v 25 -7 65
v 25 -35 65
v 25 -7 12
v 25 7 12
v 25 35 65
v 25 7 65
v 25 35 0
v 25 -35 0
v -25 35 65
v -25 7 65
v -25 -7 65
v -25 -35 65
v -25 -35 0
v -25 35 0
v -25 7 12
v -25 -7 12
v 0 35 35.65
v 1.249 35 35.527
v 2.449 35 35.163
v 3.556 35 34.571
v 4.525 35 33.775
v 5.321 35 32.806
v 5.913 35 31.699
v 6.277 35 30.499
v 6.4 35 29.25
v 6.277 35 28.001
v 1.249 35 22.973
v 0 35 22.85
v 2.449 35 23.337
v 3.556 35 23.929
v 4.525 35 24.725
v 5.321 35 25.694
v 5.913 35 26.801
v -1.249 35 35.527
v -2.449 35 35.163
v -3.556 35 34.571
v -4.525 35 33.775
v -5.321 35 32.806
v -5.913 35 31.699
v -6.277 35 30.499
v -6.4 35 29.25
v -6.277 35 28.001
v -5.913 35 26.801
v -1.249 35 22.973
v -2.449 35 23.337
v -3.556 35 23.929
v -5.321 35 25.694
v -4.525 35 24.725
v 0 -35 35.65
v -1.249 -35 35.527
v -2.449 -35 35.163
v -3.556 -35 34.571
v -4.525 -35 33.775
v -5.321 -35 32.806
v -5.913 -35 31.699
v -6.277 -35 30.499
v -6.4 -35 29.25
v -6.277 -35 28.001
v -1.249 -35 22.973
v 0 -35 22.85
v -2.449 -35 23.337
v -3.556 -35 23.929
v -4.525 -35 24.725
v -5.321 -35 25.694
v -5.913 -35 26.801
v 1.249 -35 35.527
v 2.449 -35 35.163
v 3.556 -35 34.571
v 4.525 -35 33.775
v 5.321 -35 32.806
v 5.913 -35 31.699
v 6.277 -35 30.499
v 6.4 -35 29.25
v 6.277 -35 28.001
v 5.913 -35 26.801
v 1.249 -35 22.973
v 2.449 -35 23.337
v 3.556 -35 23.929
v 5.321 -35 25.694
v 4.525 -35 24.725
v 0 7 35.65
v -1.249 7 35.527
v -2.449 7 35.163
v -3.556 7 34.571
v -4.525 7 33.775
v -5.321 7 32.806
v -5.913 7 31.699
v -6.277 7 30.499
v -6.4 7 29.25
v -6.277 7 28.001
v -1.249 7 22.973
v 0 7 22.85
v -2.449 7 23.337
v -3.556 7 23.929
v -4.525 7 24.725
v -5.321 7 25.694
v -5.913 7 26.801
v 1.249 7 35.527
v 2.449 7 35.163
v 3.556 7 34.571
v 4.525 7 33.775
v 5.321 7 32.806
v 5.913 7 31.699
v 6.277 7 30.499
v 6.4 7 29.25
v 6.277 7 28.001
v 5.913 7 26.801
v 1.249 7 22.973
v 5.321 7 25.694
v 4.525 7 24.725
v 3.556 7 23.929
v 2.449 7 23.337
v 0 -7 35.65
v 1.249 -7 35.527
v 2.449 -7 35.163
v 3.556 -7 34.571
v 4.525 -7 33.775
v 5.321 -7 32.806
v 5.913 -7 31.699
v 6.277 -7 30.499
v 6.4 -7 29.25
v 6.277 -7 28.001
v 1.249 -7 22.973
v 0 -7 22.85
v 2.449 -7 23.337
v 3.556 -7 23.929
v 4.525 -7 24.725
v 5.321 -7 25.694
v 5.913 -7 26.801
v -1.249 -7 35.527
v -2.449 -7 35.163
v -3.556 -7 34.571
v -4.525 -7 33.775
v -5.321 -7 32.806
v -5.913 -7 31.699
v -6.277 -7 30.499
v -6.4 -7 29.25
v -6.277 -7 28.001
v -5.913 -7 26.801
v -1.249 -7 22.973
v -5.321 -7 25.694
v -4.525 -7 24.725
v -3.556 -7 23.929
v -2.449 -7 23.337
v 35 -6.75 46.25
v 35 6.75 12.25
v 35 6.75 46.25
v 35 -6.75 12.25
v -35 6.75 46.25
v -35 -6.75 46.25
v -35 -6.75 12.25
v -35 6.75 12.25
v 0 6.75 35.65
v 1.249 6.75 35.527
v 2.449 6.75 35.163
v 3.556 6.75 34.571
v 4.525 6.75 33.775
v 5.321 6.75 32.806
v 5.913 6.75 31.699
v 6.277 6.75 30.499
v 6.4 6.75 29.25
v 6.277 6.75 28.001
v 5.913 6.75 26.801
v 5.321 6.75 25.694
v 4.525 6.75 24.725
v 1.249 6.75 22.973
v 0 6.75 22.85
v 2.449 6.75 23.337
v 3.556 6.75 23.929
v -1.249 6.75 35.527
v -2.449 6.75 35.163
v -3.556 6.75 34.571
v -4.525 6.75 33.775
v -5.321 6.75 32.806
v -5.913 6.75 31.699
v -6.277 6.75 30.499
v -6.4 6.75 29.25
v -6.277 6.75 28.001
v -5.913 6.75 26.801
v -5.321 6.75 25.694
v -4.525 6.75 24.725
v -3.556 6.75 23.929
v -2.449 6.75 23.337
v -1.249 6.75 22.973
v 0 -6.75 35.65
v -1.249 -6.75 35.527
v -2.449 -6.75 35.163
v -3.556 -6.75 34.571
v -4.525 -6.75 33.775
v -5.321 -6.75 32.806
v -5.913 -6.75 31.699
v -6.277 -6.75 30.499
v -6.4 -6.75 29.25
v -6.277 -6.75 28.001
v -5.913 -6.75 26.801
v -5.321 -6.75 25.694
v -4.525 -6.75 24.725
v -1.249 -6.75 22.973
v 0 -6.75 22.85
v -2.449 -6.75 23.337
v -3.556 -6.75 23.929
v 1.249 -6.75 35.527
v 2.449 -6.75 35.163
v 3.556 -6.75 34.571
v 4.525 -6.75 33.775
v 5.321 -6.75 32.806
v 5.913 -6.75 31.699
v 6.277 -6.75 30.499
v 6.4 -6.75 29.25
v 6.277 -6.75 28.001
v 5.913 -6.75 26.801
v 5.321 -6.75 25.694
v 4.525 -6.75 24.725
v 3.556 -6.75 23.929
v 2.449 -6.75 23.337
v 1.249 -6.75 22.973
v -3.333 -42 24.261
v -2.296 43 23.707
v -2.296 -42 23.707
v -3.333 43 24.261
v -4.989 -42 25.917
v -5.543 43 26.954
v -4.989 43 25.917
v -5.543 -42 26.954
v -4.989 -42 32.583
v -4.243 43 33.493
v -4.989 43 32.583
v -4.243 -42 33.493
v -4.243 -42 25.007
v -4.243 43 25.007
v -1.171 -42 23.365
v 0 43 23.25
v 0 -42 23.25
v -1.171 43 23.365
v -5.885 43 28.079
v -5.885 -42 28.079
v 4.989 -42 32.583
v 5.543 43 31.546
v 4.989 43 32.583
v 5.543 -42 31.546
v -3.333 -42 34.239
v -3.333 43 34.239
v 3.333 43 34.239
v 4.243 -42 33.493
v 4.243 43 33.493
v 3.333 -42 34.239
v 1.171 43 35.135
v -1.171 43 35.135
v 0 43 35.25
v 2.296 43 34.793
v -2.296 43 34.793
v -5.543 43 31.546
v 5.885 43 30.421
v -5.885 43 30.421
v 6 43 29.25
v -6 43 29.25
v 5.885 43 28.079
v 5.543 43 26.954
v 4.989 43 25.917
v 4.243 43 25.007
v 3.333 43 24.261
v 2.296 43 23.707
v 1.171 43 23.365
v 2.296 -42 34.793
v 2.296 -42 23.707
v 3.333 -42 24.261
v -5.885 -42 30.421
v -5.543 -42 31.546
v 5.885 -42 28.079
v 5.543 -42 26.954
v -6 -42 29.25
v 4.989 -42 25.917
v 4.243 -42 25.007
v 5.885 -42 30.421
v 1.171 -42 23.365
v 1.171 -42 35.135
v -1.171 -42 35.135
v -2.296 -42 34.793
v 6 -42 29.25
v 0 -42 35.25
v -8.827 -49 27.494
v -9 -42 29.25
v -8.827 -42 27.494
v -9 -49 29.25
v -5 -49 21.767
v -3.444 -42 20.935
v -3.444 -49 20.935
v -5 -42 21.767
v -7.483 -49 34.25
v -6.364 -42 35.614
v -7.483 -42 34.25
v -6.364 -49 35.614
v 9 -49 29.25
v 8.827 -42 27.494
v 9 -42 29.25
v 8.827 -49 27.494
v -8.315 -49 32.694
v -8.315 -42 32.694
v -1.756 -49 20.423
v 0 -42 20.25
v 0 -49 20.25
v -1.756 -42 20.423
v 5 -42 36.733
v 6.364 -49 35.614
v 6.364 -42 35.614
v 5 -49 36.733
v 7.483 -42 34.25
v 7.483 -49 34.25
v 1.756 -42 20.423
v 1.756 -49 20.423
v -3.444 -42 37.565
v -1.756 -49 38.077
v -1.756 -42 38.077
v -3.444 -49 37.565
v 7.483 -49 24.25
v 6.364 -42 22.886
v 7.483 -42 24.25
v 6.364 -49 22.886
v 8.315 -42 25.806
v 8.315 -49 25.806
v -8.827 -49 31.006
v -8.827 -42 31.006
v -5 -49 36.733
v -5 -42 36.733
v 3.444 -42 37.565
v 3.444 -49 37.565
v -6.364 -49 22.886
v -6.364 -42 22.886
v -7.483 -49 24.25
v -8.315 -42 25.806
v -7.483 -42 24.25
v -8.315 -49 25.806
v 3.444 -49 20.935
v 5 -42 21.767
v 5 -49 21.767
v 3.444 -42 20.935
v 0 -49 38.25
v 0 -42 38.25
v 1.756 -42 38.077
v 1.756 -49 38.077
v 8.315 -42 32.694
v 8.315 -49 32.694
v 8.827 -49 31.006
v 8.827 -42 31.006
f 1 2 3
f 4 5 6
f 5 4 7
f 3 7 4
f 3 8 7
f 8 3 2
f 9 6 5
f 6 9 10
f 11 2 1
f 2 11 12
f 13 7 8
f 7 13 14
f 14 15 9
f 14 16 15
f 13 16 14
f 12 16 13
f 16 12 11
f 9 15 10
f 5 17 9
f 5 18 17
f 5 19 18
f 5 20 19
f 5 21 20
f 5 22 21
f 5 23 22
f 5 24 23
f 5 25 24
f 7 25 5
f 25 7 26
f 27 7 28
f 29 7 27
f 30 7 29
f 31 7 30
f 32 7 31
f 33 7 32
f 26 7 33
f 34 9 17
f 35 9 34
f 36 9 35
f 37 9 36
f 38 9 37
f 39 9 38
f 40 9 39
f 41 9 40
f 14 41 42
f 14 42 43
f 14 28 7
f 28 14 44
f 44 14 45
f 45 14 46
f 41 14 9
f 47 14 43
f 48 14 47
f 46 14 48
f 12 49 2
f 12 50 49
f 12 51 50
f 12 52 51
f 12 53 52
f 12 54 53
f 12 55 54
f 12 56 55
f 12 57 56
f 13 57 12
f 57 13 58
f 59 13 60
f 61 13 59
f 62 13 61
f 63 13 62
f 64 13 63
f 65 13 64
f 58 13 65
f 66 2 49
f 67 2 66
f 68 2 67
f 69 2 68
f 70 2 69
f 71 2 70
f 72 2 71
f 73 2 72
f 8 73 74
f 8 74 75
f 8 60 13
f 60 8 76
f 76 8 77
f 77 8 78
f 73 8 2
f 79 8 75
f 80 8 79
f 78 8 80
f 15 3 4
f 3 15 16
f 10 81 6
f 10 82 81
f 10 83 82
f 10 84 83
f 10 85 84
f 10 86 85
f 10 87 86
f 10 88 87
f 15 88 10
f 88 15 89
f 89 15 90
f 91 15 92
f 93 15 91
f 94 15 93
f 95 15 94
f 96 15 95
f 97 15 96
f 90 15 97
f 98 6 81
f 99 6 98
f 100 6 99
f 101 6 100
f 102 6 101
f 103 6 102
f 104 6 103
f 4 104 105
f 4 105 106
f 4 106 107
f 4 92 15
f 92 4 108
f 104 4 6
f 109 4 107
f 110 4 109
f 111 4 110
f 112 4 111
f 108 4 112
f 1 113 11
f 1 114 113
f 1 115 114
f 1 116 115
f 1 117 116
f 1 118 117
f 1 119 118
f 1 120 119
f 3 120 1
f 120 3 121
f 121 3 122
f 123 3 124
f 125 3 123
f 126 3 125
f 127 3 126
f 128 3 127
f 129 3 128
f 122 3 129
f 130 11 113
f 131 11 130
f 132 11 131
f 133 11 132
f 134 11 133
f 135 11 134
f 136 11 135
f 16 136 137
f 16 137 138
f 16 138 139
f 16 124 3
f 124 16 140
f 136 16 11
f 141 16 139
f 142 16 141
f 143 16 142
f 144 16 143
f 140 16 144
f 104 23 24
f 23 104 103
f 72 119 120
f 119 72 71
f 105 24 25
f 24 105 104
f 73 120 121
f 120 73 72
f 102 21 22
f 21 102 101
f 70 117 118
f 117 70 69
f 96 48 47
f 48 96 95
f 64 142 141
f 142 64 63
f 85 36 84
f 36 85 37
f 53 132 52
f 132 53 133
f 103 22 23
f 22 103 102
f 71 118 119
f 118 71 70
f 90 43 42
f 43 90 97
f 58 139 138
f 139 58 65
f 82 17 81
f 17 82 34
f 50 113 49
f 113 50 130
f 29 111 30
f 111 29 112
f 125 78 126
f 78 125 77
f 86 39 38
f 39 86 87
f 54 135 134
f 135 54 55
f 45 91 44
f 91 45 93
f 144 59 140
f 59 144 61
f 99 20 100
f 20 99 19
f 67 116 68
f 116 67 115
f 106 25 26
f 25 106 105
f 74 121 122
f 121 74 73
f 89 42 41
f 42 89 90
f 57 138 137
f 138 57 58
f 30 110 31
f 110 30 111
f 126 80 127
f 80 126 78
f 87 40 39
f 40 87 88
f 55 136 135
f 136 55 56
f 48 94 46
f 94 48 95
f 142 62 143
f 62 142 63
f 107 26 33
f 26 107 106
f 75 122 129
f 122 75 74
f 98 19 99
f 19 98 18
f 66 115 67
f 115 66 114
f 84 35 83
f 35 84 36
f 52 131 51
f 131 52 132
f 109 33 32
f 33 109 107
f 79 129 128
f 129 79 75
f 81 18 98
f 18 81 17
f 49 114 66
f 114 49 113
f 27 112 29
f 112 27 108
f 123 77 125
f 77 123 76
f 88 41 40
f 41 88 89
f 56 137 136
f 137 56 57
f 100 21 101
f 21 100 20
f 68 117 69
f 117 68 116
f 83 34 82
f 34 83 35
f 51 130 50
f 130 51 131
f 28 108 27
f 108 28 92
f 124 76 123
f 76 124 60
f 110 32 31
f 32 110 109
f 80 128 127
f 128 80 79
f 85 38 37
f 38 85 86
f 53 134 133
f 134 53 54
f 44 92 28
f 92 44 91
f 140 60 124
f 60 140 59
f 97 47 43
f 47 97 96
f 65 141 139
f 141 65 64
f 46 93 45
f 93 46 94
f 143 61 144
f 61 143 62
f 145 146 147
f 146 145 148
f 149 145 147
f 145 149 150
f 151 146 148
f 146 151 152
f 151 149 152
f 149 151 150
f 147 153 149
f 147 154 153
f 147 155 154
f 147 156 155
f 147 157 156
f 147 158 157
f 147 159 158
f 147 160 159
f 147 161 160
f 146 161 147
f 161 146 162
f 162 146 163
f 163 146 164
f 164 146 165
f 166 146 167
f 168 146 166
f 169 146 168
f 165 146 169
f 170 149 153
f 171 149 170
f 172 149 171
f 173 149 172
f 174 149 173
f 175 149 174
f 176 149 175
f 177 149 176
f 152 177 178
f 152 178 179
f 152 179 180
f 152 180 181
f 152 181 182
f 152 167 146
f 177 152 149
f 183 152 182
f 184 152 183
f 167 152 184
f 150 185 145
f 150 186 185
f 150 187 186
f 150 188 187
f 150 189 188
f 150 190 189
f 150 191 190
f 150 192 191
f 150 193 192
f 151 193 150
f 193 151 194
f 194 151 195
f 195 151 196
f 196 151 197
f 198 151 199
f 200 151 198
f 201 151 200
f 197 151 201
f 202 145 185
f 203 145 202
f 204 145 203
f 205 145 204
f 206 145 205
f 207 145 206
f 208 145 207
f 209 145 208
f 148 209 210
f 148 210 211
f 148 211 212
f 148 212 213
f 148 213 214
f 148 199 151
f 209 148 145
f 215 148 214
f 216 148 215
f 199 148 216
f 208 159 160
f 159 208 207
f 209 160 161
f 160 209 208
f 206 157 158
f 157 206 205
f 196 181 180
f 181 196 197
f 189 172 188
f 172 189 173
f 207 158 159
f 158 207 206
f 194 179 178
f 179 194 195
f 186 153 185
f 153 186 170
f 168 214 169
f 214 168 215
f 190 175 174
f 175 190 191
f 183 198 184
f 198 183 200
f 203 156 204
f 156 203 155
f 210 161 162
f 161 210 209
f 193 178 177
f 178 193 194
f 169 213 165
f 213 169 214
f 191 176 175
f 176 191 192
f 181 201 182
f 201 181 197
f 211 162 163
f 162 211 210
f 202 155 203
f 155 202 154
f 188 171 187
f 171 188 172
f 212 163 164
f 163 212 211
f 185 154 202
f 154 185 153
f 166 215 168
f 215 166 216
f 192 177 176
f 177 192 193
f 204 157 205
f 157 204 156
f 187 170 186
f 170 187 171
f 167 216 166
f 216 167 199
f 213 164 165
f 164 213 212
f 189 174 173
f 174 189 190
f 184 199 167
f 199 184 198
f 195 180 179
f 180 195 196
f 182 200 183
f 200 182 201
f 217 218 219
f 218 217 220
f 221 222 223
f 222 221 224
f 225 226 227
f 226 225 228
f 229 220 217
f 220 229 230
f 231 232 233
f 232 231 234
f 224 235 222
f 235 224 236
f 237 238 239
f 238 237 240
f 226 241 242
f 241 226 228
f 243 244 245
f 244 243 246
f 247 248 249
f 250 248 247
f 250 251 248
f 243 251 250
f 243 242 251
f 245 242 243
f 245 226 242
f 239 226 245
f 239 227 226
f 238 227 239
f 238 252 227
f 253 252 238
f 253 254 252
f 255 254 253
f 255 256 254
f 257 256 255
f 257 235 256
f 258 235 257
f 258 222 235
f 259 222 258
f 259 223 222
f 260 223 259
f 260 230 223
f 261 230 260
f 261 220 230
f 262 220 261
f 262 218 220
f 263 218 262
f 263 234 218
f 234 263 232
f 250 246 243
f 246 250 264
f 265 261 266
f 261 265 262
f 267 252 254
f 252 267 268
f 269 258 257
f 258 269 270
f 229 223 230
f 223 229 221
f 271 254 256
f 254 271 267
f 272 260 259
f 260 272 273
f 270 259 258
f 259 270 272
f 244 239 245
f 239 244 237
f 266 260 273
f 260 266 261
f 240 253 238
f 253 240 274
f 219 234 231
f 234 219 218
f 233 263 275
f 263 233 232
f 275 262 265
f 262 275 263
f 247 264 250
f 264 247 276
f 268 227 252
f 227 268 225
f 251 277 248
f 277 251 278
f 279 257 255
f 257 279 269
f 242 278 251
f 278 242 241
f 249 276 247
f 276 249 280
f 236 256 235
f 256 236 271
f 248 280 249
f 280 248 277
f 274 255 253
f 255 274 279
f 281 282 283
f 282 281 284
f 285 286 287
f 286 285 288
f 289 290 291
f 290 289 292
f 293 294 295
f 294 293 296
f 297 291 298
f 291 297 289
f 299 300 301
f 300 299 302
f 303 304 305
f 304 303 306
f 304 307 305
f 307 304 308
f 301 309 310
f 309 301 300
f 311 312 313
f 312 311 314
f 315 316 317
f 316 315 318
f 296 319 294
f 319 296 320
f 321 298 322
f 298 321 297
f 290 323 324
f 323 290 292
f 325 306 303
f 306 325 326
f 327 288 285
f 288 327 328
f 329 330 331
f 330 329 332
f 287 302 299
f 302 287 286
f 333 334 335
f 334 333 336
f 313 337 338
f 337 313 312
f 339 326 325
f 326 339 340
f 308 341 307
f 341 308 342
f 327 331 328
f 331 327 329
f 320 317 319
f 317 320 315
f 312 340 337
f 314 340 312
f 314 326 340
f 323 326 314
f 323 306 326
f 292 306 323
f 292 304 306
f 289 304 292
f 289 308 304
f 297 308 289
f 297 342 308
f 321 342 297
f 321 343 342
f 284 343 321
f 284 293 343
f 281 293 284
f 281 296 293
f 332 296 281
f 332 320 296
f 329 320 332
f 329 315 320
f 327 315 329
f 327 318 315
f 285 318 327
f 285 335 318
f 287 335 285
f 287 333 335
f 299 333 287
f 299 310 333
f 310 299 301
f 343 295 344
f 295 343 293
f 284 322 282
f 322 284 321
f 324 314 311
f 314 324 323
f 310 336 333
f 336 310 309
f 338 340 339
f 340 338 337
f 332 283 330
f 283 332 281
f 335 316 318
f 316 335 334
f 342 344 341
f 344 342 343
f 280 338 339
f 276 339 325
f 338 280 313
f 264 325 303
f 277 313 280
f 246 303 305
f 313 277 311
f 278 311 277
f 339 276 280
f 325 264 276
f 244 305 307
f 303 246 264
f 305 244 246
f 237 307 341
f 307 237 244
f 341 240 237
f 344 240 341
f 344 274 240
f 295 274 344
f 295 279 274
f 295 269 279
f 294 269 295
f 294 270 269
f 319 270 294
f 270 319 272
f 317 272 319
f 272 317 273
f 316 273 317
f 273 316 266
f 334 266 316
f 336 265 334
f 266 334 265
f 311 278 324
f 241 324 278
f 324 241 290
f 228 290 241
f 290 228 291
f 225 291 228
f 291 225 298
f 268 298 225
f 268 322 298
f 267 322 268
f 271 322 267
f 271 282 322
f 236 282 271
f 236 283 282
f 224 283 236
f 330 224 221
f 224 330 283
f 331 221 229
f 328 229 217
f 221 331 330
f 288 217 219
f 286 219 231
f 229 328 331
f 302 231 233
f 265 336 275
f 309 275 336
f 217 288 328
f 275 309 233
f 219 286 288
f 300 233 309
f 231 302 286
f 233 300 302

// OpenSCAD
$fn = 32;

// ------------------------------------------------------------------------
// Clevis joint: 50 mm clevis, pin d12
// Every part is its own module, assembly() places them once.
// ------------------------------------------------------------------------

// --- part 1 ---
module clevis() {
  difference() {
    translate([-25, -35, 0]) cube([50, 70, 65]);
    translate([-26, -7, 12]) cube([52, 14, 54]);
    translate([0, 0, 29.25]) rotate([90, 0, 0]) cylinder(h = 72, d = 12.8, center = true);
  }
}

// --- part 2 ---
module eye() {
  difference() {
    translate([-35, -6.75, 0]) cube([70, 13.5, 34]);
    translate([0, 0, 17]) rotate([90, 0, 0]) cylinder(h = 15.5, d = 12.8, center = true);
  }
}

// --- part 3 ---
module pin() {
  rotate([0, 90, 0]) cylinder(h = 86, d = 12, center = true);
  translate([-49, 0, 0]) rotate([0, 90, 0]) cylinder(h = 7, d = 18);
}

// --- assembly ---
module assembly() {
  translate([0, 0, 0]) rotate([0, 0, 0]) clevis();
  translate([0, 0, 12.25]) rotate([0, 0, 0]) eye();
  translate([0, 0, 29.25]) rotate([0, 0, 90]) pin();
}

assembly();
